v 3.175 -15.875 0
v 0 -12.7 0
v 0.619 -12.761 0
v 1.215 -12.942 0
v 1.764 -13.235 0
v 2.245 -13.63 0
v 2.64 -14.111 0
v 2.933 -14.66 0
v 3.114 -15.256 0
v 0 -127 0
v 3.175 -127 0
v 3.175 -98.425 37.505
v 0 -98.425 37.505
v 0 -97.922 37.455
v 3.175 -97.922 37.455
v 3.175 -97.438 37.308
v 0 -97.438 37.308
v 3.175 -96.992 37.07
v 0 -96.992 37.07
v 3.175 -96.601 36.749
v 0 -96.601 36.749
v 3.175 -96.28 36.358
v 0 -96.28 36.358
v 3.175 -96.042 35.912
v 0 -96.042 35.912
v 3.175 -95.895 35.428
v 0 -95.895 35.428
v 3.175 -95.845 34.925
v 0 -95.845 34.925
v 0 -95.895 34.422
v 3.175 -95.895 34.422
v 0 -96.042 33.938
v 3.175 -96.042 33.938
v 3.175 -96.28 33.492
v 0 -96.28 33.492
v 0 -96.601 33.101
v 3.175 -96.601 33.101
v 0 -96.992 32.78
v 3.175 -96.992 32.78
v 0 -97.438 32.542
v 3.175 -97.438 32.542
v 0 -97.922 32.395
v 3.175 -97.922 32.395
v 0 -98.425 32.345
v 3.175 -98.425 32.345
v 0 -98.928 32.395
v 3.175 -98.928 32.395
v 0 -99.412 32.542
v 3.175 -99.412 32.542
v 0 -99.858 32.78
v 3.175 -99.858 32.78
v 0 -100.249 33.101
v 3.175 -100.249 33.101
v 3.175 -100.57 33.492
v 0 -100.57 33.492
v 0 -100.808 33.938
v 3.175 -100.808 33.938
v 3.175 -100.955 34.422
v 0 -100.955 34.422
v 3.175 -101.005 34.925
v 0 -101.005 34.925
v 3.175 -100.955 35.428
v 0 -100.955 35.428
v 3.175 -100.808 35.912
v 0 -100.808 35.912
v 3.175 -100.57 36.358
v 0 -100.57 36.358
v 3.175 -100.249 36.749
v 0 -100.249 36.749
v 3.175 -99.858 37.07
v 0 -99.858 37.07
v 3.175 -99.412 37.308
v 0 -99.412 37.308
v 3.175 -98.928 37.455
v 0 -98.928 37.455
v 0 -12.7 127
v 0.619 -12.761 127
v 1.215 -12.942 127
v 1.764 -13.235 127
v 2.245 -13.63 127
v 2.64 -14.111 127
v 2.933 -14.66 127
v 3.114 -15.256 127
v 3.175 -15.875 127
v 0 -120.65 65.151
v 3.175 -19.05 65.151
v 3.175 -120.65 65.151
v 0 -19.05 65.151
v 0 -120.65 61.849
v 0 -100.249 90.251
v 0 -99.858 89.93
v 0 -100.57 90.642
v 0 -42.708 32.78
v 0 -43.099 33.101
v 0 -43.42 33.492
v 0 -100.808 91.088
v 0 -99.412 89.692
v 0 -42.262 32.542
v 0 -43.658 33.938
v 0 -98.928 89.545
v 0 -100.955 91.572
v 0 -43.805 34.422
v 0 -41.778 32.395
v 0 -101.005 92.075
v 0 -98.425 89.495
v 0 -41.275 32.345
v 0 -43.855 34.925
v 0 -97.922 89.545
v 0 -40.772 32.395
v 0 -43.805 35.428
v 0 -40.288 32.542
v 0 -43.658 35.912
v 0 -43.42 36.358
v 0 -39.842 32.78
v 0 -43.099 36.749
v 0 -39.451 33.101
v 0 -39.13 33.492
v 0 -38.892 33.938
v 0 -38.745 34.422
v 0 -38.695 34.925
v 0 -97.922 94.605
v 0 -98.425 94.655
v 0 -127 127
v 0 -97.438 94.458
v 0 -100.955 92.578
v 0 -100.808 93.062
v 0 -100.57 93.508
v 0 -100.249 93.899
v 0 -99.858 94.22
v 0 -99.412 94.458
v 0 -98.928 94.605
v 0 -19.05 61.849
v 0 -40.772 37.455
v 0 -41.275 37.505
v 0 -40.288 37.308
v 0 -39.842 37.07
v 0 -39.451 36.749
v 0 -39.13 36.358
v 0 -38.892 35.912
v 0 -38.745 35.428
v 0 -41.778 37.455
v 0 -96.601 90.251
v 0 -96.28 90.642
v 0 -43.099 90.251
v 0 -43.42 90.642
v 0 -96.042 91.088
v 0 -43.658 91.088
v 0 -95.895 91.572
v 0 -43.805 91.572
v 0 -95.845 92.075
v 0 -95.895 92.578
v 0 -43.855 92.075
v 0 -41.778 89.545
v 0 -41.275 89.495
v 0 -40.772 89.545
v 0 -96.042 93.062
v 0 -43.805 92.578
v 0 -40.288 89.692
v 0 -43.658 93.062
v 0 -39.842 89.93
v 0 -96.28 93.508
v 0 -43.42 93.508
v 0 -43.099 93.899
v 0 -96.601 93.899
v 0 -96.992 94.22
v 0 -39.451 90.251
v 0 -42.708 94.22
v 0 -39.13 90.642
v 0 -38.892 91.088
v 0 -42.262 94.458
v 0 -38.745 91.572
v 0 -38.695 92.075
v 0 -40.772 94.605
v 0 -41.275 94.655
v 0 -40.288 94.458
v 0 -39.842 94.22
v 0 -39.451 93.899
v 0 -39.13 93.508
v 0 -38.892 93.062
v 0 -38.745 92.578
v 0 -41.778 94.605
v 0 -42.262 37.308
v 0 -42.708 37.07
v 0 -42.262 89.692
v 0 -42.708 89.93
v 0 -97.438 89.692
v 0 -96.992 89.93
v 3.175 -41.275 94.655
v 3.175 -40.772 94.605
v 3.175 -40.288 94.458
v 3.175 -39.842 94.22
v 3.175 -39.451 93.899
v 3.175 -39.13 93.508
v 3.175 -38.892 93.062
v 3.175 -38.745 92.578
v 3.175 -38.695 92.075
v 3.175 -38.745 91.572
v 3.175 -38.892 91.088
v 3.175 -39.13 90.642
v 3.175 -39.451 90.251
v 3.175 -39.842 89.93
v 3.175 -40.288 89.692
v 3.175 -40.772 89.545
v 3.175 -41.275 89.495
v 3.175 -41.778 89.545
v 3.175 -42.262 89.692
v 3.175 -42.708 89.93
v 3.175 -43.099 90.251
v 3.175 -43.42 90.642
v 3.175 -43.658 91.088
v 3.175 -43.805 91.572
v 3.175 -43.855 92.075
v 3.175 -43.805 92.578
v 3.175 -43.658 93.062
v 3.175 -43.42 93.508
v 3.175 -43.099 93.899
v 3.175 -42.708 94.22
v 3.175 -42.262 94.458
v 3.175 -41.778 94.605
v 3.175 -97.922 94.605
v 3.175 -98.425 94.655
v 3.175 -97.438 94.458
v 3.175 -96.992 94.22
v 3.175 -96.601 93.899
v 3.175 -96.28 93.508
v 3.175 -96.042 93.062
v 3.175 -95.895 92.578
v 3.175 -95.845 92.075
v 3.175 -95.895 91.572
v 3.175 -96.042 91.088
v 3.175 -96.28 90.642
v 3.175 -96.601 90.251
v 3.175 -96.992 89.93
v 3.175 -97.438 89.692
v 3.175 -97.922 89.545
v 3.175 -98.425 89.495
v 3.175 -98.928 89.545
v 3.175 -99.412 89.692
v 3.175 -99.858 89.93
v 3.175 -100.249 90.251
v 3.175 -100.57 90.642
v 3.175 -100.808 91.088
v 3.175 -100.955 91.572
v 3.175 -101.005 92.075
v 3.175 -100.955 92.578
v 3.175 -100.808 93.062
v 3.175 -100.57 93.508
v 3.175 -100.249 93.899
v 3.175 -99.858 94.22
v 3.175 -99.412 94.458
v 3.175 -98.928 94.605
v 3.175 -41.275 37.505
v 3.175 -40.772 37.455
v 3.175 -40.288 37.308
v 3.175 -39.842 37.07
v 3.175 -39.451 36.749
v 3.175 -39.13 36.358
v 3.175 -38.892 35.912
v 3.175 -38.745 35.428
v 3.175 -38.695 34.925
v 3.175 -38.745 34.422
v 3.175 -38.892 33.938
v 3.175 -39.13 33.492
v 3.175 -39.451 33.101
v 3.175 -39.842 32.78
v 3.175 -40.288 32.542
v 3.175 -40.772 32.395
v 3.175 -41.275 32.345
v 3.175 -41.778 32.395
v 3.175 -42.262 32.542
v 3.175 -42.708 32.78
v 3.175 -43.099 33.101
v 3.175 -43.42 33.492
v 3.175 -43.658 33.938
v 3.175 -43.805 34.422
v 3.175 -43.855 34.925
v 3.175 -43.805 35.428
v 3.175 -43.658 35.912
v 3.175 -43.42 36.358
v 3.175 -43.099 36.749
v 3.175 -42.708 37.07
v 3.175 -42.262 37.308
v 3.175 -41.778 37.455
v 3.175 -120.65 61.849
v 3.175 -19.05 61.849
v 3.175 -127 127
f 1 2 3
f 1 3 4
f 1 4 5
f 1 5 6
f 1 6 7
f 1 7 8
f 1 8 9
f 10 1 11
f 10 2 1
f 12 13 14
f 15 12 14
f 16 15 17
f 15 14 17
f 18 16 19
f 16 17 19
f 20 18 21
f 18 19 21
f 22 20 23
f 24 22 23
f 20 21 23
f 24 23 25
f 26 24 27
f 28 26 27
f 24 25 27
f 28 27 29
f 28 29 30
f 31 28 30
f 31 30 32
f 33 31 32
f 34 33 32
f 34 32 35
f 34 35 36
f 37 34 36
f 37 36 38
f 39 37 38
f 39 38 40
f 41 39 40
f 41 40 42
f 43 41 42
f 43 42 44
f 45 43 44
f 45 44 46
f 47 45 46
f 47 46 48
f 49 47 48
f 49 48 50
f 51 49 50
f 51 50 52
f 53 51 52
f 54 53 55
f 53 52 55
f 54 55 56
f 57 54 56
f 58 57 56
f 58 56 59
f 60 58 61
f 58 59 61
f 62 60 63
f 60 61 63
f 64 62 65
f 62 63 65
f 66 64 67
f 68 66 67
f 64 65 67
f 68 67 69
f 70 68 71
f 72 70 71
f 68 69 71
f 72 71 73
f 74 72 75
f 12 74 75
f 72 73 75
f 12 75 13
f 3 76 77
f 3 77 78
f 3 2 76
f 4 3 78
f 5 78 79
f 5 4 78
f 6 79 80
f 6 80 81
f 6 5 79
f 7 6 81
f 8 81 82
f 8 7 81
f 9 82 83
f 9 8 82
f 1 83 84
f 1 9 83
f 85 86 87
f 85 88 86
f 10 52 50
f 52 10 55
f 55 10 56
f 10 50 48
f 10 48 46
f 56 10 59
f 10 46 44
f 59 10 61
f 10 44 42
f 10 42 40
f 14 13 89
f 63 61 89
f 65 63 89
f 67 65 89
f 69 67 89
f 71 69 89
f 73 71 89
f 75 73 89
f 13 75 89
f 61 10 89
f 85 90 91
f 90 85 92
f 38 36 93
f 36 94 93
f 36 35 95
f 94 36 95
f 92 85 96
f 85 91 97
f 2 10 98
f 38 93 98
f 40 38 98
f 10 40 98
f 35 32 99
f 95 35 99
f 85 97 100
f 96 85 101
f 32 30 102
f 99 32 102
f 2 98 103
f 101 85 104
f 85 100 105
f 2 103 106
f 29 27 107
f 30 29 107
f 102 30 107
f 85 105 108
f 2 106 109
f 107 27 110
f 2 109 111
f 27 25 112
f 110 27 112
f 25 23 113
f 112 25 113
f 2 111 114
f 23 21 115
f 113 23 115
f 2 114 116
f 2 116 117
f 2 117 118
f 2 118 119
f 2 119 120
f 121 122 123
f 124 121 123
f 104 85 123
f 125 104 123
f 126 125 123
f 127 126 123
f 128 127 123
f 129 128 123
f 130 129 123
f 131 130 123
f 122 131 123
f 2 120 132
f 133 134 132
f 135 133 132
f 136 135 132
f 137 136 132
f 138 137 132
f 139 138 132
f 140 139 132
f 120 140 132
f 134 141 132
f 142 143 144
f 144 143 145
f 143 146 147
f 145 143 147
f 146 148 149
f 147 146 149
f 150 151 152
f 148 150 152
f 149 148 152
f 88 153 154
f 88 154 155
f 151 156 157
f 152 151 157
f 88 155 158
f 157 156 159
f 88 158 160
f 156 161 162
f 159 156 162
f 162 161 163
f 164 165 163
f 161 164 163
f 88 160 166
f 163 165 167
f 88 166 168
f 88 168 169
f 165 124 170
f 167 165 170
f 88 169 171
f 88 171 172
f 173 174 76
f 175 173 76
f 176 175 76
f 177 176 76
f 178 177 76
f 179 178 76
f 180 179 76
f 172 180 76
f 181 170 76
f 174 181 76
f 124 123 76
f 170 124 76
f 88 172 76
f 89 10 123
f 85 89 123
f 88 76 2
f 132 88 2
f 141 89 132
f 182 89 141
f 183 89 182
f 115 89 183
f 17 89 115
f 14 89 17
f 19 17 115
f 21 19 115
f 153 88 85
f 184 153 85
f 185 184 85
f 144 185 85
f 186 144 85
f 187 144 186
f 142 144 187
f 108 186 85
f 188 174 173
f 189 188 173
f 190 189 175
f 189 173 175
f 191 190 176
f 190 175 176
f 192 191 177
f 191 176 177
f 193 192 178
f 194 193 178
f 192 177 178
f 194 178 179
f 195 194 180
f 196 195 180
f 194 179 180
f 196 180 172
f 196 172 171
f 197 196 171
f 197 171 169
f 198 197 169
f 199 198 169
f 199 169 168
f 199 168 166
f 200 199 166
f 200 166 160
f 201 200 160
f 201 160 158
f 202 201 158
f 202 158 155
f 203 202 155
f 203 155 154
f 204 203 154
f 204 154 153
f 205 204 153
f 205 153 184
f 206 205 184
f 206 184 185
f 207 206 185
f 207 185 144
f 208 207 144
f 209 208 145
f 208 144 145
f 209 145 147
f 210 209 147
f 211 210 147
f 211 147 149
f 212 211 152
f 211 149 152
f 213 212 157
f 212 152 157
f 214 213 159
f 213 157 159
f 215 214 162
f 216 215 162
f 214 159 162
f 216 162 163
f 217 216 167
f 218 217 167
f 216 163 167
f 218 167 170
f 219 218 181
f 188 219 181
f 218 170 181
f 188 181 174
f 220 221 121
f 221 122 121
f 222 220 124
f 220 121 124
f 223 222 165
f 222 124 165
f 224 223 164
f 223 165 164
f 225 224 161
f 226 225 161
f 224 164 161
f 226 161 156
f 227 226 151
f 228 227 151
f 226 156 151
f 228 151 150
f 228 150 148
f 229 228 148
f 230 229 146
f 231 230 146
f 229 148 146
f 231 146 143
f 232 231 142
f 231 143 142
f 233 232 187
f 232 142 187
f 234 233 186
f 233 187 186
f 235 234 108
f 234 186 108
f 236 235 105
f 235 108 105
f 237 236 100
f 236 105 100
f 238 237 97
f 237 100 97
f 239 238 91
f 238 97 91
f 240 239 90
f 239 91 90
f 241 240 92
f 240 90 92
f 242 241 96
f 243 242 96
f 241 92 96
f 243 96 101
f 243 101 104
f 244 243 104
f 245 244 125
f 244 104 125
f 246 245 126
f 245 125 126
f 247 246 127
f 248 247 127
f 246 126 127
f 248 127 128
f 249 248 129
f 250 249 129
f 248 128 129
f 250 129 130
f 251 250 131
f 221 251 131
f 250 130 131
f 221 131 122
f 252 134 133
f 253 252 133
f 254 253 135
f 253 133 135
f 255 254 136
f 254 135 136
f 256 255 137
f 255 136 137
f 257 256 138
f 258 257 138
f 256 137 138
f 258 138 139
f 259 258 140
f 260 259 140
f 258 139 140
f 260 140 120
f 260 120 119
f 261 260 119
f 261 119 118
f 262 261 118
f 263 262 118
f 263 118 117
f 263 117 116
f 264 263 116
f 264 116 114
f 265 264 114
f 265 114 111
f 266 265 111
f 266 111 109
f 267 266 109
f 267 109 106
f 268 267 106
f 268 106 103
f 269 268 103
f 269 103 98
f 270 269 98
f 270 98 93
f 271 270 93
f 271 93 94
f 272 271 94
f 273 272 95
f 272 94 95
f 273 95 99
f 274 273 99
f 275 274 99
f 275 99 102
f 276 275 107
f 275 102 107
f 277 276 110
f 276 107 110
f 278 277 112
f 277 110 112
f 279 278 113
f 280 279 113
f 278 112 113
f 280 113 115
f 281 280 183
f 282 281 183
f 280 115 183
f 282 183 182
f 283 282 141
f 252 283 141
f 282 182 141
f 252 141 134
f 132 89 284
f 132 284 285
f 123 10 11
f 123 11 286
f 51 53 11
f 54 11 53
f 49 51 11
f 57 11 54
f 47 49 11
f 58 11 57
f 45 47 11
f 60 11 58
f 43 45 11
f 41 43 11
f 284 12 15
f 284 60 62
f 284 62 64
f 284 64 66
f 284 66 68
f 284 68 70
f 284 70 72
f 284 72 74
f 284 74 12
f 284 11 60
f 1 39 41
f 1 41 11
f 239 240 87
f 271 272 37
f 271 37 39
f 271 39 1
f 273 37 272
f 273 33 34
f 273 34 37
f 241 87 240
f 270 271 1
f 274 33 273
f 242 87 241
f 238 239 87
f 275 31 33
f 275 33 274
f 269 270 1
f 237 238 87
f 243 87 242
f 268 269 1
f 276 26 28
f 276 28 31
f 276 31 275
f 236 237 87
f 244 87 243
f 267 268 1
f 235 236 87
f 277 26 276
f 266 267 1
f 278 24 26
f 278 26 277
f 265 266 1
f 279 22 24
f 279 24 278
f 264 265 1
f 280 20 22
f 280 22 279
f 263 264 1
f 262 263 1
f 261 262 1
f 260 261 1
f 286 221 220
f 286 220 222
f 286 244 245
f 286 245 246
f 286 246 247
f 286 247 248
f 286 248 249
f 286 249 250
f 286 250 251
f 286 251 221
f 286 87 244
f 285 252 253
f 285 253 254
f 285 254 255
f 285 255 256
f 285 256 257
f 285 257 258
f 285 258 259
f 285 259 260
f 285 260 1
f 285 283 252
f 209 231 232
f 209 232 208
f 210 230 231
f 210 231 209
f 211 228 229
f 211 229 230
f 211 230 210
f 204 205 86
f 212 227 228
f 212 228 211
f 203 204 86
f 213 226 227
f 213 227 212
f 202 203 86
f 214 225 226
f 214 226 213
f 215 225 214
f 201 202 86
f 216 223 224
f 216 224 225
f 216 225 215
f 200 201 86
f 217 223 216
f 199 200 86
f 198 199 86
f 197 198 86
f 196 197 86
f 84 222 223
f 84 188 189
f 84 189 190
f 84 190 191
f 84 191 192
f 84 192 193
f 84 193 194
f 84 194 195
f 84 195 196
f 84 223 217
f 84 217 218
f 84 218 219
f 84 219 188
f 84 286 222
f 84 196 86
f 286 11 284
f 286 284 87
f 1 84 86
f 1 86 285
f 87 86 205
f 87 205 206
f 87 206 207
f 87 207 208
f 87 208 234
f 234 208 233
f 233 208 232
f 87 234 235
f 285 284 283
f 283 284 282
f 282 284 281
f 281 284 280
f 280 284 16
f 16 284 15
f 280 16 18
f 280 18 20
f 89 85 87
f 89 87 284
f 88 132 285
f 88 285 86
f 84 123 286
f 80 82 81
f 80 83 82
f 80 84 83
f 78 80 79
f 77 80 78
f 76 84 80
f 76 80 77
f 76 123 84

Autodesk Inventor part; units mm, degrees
ref_plane "YZ Plane" through (0, 0, 0) normal (1, 0, 0) x (0, 1, 0)
ref_plane "XZ Plane" through (0, 0, 0) normal (0, 1, 0) x (-1, 0, 0)
ref_plane "XY Plane" through (0, 0, 0) normal (0, 0, 1) x (1, 0, 0)
sketch "Sketch1" plane through (0, 0, 0) normal (1, 0, 0) x (0, 1, 0)
  line L0 (0, 0) -> (-127, 0)
  line L1 (-127, 0) -> (-127, 127)
  line L2 (-127, 127) -> (0, 127)
  line L3 (0, 127) -> (0, 0)
  line L4 (-19.05, 65.151) -> (-120.65, 65.151)
  line L5 (-120.65, 65.151) -> (-120.65, 61.849)
  line L6 (-120.65, 61.849) -> (-19.05, 61.849)
  line L7 (-19.05, 61.849) -> (-19.05, 65.151)
  line L8 (0, 47.625) -> (-12.7, 47.625)
  line L9 (-12.7, 47.625) -> (-12.7, 79.375)
  line L10 (-12.7, 79.375) -> (0, 79.375)
  line L11 (0, 79.375) -> (0, 47.625)
  line L12 (-12.7, 47.625) -> (-12.7, 0)
  line L13 (-12.7, 79.375) -> (-12.7, 127)
  dimension "d0" = 127
  dimension "d1" = 127
  dimension "d2" = 6.35
  dimension "d4" = 3.302
  dimension "d5" = 61.849
  dimension "d25" = 12.7
  dimension "d26" = 31.75
  dimension "d27" = 47.625
  dimension "d28" = 6.35
extrude "Extrusion1" add sketch "Sketch1" along normal blind 3.175 contours L0 L1 L2 L13 L9 L12
sketch "Sketch3" plane through (0, 0, 0) normal (-1, 0, 0) x (0, 0, 1)
  circle A0 centre (34.925, -41.275) radius 2.5797
  line L0 (0, -127) -> (0, -12.7) projected
  line L1 (0, -12.7) -> (0, 0)
  line L2 (0, 0) -> (20.4302, 0)
  line L3 (20.4302, 0) -> (0, -12.7)
  circle A1 centre (34.925, -98.425) radius 2.5797
  circle A2 centre (92.075, -41.275) radius 2.5797
  circle A3 centre (92.075, -98.425) radius 2.5797
  line L4 (0, -12.7) -> (127, -12.7) projected
  dimension "d31" = 57.15
  dimension "d34" = 57.15
  dimension "d37" = 34.925
  dimension "d38" = 28.575
  dimension "d39" = 5.1594
extrude "Extrusion4" cut sketch "Sketch3" against normal through all contours A0 | A1 | A2 | A3
fillet "Fillet5" radius 3.175 1 edges at (3.175, -12.7, 63.5)
equation "\"d5\" = -0.5 * d4 + 0.5 * d1"
equation "\"d27\" = -0.5 * d26 + 0.5 * d1"
equation "\"d28\" = d2"
properties part number "Gripper plate"
